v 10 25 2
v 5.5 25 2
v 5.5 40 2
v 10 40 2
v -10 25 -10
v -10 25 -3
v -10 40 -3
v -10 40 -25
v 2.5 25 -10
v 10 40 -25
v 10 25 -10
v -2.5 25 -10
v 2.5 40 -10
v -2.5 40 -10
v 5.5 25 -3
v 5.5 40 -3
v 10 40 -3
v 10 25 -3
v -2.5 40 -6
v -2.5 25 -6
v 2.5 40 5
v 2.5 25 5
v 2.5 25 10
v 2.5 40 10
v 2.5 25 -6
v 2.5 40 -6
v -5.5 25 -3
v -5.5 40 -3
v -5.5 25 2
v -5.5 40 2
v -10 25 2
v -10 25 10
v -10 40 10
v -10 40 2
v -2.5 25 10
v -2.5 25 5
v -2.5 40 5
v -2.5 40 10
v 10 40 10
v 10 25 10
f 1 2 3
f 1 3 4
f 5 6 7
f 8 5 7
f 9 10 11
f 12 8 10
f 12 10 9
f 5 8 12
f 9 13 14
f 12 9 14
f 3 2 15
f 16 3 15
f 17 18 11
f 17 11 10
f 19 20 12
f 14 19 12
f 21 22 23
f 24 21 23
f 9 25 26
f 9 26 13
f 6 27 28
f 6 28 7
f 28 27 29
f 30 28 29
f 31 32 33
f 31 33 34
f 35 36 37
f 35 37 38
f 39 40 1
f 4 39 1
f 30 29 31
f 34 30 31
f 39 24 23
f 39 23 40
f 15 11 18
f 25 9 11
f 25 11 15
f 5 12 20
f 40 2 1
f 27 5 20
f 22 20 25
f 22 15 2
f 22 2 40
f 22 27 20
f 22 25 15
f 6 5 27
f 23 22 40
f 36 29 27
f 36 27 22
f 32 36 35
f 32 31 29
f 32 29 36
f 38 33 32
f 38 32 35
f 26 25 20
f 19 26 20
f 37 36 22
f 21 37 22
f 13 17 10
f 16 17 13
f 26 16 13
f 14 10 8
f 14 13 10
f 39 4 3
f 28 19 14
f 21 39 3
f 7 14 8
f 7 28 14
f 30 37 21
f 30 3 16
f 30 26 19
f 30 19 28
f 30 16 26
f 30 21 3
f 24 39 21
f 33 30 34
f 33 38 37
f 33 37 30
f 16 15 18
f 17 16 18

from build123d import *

# Parameters (mm, degrees)
SKETCH2_W           = 20
SKETCH2_H           = 20
BOSS_EXTRUDE2_DEPTH = 40
SKETCH4_W           = 5
SKETCH4_H           = 10
CUT_EXTRUDE1_DEPTH  = 41
CIRPATTERN1_COUNT   = 4
SKETCH10_W          = 20
SKETCH10_H          = 15
BOSS_EXTRUDE4_DEPTH = 15
CUT_EXTRUDE3_DEPTH  = 21
SKETCH13_W          = 20
SKETCH13_H          = 25
CUT_EXTRUDE4_DEPTH  = 21


with BuildPart() as part:
    # Sketch2 → Boss-Extrude2 (new body)
    with BuildSketch(Plane(origin=(0, 0, 0), x_dir=(1, 0, 0), z_dir=(0, 1, 0))):
        Rectangle(SKETCH2_W, SKETCH2_H)
    extrude(amount=BOSS_EXTRUDE2_DEPTH)

    # Sketch4 → Cut-Extrude1 (cut, through all)
    with BuildSketch(Plane.XZ):
        with Locations((0, 10)):
            Rectangle(SKETCH4_W, SKETCH4_H)
    cut_extrude1 = extrude(amount=-CUT_EXTRUDE1_DEPTH, mode=Mode.SUBTRACT)

    # CirPattern1: Cut-Extrude1 ×4 about axis
    cirpattern1_axis = Axis((0, 0, -0.5), (0, 1, 0))
    for i in range(1, CIRPATTERN1_COUNT):
        add(cut_extrude1.rotate(cirpattern1_axis, i * 360 / CIRPATTERN1_COUNT), mode=Mode.SUBTRACT)

    # Sketch10 → Boss-Extrude4 (add)
    with BuildSketch(Plane(origin=(0, 0, -10), x_dir=(-1, 0, 0), z_dir=(0, 0, -1))):
        with Locations((0, 32.5)):
            Rectangle(SKETCH10_W, SKETCH10_H)
    extrude(amount=BOSS_EXTRUDE4_DEPTH)

    # Sketch12 → Cut-Extrude3 (cut, through all)
    with BuildSketch(Plane.ZY.offset(10)):
        Polygon((-25, 40), (-10, 25), (-25, 25), align=None)
    extrude(amount=-CUT_EXTRUDE3_DEPTH, mode=Mode.SUBTRACT)

    # Sketch13 → Cut-Extrude4 (cut, through all)
    with BuildSketch(Plane.ZY.offset(10)):
        with Locations((0, 12.5)):
            Rectangle(SKETCH13_W, SKETCH13_H)
    extrude(amount=-CUT_EXTRUDE4_DEPTH, mode=Mode.SUBTRACT)


solid = part.part
